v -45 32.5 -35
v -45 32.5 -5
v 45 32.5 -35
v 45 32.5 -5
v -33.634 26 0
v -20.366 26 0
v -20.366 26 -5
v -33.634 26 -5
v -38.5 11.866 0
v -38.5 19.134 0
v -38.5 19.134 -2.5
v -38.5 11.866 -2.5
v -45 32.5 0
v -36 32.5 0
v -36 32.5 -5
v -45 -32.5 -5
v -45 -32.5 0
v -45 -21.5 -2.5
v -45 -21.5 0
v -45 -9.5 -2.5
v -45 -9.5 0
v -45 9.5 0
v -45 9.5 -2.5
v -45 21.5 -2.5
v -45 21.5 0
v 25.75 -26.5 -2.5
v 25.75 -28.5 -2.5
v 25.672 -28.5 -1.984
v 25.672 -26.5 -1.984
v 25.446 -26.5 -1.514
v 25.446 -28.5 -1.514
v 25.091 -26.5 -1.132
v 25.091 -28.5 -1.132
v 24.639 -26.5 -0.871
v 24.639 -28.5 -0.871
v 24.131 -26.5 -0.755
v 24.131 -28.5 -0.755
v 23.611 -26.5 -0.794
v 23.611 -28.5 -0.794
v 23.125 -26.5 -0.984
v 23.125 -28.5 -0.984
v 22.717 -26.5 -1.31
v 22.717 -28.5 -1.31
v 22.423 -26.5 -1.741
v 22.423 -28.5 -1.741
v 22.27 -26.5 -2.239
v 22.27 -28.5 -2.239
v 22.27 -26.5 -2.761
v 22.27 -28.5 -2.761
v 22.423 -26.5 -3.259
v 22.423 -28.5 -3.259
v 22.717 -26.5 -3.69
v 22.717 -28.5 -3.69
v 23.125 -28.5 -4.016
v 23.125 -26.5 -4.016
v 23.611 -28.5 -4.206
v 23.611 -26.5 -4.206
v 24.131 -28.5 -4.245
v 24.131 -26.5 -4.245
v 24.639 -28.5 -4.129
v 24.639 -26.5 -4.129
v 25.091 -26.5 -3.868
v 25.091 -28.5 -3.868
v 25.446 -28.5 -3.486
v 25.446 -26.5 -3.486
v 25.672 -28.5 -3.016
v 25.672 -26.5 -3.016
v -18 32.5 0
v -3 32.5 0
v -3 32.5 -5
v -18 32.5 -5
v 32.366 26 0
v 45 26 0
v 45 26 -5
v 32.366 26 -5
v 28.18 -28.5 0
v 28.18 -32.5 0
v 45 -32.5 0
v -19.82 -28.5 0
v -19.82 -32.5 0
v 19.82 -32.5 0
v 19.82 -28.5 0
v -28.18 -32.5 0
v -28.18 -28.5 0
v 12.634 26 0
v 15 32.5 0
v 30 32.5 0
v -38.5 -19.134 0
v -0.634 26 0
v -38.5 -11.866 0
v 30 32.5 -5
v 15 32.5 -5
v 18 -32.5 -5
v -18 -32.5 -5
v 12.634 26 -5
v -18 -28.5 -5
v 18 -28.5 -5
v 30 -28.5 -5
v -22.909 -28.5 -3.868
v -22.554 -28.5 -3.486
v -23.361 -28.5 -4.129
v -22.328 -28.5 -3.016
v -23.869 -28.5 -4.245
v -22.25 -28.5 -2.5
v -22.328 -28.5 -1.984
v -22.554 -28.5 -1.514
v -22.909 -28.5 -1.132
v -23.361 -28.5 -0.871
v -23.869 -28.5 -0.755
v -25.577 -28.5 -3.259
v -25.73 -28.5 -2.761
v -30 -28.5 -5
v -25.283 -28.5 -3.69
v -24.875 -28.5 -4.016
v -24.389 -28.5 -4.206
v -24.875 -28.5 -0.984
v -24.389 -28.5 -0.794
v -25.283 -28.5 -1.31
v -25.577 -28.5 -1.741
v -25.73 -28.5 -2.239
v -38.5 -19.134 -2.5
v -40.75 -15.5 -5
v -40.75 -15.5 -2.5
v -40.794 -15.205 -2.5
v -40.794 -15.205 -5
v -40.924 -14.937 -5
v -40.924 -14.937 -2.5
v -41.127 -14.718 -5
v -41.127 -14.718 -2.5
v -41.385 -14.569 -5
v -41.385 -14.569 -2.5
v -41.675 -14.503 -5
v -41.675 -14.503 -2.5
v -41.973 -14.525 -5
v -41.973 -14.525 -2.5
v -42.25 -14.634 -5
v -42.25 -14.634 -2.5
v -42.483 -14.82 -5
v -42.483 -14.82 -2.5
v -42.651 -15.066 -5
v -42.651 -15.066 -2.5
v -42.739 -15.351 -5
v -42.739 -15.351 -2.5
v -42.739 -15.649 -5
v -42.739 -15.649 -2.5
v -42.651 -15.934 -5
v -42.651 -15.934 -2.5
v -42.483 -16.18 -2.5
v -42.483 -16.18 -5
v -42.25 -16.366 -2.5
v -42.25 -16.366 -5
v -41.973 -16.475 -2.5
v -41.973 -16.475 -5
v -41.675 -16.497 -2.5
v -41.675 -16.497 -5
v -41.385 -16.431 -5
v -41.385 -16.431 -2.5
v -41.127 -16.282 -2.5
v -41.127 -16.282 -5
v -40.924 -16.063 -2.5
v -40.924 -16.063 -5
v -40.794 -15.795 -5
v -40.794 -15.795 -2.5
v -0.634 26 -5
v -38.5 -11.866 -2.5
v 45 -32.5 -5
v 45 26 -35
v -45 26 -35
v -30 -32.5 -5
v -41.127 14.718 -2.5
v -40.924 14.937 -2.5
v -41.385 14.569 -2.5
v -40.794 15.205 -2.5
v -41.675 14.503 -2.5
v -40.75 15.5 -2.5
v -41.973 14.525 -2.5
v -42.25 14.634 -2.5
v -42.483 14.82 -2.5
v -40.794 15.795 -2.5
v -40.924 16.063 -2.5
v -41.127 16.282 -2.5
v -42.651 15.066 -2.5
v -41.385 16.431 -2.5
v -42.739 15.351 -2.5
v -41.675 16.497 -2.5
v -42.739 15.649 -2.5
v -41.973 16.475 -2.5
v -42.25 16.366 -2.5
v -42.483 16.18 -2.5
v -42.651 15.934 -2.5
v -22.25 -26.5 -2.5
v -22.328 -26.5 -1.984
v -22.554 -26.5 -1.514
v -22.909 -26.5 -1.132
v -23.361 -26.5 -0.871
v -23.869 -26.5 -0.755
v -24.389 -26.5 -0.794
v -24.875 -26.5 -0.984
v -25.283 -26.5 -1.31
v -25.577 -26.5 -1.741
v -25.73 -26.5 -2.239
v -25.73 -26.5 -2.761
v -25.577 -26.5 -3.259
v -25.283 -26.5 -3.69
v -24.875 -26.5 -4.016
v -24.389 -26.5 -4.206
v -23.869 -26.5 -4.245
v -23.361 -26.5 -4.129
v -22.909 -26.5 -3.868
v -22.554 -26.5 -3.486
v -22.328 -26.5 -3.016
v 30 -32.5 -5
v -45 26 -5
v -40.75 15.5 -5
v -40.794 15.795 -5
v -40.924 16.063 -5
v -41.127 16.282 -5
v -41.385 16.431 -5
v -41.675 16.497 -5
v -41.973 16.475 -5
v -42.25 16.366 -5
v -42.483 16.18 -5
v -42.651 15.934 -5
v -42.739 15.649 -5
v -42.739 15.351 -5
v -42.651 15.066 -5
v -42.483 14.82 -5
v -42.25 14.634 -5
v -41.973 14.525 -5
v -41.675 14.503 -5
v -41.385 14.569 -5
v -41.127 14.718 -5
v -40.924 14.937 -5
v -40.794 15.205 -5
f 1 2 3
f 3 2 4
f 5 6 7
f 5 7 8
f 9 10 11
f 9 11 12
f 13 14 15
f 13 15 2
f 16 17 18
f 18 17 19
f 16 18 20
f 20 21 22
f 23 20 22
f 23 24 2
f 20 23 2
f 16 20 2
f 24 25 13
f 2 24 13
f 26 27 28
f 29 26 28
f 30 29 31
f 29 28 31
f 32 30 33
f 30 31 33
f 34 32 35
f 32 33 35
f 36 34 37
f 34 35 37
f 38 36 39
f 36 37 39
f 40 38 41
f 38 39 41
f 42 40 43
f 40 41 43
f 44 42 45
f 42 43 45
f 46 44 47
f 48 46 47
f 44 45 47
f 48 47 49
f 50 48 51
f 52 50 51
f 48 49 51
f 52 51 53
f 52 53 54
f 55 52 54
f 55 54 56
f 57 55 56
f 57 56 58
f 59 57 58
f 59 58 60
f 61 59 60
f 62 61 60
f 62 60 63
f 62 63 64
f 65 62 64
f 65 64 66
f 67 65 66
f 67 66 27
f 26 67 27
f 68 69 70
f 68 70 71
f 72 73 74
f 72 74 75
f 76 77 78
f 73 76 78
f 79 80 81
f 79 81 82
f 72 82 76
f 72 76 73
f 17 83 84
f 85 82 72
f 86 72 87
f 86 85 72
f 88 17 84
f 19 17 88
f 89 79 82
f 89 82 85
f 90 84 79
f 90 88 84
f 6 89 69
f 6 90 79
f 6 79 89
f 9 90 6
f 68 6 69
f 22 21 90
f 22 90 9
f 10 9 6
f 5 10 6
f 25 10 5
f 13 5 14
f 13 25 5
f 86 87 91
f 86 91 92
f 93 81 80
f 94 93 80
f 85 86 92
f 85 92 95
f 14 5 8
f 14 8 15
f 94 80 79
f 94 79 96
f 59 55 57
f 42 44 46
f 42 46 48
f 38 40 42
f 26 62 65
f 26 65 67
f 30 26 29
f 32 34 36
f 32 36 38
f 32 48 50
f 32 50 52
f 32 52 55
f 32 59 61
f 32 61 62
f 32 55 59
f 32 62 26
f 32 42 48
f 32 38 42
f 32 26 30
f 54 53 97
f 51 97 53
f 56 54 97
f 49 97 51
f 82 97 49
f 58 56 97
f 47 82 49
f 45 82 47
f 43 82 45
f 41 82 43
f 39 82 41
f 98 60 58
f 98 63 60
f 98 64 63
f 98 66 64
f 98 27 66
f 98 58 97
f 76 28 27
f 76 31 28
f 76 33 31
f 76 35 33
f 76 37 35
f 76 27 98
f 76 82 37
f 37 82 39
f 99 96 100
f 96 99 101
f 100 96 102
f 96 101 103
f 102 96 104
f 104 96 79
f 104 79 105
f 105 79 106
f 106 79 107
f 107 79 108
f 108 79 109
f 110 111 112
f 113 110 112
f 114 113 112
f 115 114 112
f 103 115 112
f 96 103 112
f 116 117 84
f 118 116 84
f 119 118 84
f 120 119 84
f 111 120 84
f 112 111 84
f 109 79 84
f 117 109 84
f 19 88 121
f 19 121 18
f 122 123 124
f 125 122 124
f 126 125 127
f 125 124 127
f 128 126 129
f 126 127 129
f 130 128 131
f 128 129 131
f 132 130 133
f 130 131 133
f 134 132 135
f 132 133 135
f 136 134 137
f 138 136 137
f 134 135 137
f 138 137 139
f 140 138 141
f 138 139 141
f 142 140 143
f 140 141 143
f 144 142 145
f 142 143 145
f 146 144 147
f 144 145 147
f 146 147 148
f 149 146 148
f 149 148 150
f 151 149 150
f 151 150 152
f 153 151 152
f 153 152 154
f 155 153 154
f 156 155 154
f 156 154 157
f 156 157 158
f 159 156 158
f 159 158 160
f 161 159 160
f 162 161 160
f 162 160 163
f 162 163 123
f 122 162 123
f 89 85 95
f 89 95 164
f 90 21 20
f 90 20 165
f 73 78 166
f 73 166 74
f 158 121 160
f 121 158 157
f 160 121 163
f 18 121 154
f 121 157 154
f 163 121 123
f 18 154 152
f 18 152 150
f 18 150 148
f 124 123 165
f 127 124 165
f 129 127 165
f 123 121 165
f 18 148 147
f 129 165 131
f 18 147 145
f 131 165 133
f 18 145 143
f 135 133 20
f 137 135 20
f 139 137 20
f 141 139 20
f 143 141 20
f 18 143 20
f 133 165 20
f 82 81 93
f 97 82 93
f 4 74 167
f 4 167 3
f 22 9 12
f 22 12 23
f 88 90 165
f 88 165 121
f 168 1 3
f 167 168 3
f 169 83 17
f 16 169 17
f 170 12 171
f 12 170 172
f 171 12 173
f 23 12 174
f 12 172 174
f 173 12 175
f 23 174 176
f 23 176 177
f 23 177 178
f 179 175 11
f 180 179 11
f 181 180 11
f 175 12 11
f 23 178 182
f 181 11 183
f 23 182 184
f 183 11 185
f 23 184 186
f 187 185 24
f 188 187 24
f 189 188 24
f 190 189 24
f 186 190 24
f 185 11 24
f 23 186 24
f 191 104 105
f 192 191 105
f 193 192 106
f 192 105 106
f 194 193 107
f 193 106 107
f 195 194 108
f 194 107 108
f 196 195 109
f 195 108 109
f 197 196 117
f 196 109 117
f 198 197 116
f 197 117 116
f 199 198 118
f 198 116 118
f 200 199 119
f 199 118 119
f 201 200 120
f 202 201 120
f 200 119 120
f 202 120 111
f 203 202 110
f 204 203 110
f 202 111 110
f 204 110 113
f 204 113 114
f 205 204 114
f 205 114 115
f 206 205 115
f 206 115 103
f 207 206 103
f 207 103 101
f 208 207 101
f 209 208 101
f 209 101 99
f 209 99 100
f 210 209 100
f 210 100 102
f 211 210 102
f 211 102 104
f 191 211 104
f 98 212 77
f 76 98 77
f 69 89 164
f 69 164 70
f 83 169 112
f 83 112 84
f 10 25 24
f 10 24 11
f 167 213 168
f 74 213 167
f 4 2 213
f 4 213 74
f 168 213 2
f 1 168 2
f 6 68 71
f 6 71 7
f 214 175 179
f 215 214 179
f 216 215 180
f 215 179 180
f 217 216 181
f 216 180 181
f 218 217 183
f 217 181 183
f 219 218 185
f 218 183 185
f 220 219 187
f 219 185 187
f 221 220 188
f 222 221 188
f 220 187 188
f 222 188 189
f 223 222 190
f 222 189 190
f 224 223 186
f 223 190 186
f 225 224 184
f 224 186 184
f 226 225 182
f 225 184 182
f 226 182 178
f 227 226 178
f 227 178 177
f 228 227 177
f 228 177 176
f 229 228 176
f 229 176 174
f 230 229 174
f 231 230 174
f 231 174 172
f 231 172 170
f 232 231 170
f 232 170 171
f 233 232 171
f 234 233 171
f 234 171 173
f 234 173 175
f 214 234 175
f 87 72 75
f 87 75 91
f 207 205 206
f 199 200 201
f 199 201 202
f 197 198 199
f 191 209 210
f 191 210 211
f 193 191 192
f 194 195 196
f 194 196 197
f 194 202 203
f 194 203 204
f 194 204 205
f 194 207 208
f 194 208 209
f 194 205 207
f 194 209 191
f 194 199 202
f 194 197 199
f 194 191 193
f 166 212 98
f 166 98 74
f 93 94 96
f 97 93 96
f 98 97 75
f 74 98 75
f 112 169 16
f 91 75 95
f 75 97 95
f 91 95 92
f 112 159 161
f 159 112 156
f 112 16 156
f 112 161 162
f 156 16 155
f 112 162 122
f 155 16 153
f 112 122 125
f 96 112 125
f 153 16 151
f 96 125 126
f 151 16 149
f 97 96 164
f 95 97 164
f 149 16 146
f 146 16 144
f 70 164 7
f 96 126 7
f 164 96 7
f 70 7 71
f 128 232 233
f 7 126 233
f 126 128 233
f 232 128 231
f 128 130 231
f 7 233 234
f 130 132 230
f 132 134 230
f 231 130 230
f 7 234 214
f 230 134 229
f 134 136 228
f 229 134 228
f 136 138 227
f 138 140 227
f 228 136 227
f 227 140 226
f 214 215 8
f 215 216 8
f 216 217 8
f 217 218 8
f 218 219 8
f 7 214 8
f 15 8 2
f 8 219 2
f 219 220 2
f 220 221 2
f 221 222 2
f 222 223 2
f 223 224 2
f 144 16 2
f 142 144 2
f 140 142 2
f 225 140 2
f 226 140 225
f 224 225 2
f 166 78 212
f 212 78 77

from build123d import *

# Parameters (mm, degrees)
BINDER_W        = 65
BINDER_H        = 90
PAD_DEPTH       = 5
POCKET_DEPTH    = 5.001
POCKET001_DEPTH = 2.5
POCKET002_DEPTH = 4
SKETCH007_R     = 1.75
POCKET003_DEPTH = 6
SKETCH008_R     = 1
POCKET004_DEPTH = 5.001
SKETCH002_W     = 90
SKETCH002_H     = 6.5
PAD001_DEPTH    = 30


with BuildPart() as body001:
    # Binder → Pad (new body)
    with BuildSketch(Plane(origin=(0, 0, 0), x_dir=(0, 1, 0), z_dir=(0, 0, 1))):
        Rectangle(BINDER_W, BINDER_H)
    extrude(amount=-PAD_DEPTH)

    # Sketch004 (on Face5 of Pad) → Pocket (cut, through all)
    with BuildSketch(Plane.XY):
        Polygon((45, 32.5), (45, 26), (32.365807, 26), (30, 32.5), align=None)
        Polygon((15, 32.5), (12.634193, 26), (-0.634193, 26), (-3, 32.5), align=None)
        Polygon((-18, 32.5), (-20.365807, 26), (-33.634193, 26), (-36, 32.5), align=None)
    extrude(amount=-POCKET_DEPTH, mode=Mode.SUBTRACT)

    # Sketch005 (on Face5 of Pad) → Pocket001 (cut)
    with BuildSketch(Plane.XY):
        Polygon((-45, 21.5), (-38.5, 19.134195), (-38.5, 11.865805), (-45, 9.5), align=None)
        Polygon((-45, -9.5), (-38.5, -11.865805), (-38.5, -19.134195), (-45, -21.5), align=None)
    extrude(amount=-POCKET001_DEPTH, mode=Mode.SUBTRACT)

    # Sketch006 (on Face1 of Pad) → Pocket002 (cut)
    with BuildSketch(Plane.XZ.offset(32.5)):
        Polygon((-30, -5), (-28.180149, 0), (-19.819851, 0), (-18, -5), align=None)
        Polygon((30, -5), (28.180149, 0), (19.819851, 0), (18, -5), align=None)
    extrude(amount=-POCKET002_DEPTH, mode=Mode.SUBTRACT)

    # Sketch007 (on Face1 of Pad) → Pocket003 (cut)
    with BuildSketch(Plane.XZ.offset(32.5)):
        with Locations((-24, -2.5)):
            Circle(SKETCH007_R)
        with Locations((24, -2.5)):
            Circle(SKETCH007_R)
    extrude(amount=-POCKET003_DEPTH, mode=Mode.SUBTRACT)

    # Sketch008 (on Face5 of Pad) → Pocket004 (cut, through all)
    with BuildSketch(Plane.XY):
        with Locations((-41.75, 15.5)):
            Circle(SKETCH008_R)
        with Locations((-41.75, -15.5)):
            Circle(SKETCH008_R)
    extrude(amount=-POCKET004_DEPTH, mode=Mode.SUBTRACT)


with BuildPart() as body002:
    # Sketch002 (on Face1 of Binder001) → Pad001 (new body)
    with BuildSketch(Plane.XY.offset(-5)):
        with Locations((0, 29.25)):
            Rectangle(SKETCH002_W, SKETCH002_H)
    extrude(amount=-PAD001_DEPTH)


solid = Compound([body001.part, body002.part])
